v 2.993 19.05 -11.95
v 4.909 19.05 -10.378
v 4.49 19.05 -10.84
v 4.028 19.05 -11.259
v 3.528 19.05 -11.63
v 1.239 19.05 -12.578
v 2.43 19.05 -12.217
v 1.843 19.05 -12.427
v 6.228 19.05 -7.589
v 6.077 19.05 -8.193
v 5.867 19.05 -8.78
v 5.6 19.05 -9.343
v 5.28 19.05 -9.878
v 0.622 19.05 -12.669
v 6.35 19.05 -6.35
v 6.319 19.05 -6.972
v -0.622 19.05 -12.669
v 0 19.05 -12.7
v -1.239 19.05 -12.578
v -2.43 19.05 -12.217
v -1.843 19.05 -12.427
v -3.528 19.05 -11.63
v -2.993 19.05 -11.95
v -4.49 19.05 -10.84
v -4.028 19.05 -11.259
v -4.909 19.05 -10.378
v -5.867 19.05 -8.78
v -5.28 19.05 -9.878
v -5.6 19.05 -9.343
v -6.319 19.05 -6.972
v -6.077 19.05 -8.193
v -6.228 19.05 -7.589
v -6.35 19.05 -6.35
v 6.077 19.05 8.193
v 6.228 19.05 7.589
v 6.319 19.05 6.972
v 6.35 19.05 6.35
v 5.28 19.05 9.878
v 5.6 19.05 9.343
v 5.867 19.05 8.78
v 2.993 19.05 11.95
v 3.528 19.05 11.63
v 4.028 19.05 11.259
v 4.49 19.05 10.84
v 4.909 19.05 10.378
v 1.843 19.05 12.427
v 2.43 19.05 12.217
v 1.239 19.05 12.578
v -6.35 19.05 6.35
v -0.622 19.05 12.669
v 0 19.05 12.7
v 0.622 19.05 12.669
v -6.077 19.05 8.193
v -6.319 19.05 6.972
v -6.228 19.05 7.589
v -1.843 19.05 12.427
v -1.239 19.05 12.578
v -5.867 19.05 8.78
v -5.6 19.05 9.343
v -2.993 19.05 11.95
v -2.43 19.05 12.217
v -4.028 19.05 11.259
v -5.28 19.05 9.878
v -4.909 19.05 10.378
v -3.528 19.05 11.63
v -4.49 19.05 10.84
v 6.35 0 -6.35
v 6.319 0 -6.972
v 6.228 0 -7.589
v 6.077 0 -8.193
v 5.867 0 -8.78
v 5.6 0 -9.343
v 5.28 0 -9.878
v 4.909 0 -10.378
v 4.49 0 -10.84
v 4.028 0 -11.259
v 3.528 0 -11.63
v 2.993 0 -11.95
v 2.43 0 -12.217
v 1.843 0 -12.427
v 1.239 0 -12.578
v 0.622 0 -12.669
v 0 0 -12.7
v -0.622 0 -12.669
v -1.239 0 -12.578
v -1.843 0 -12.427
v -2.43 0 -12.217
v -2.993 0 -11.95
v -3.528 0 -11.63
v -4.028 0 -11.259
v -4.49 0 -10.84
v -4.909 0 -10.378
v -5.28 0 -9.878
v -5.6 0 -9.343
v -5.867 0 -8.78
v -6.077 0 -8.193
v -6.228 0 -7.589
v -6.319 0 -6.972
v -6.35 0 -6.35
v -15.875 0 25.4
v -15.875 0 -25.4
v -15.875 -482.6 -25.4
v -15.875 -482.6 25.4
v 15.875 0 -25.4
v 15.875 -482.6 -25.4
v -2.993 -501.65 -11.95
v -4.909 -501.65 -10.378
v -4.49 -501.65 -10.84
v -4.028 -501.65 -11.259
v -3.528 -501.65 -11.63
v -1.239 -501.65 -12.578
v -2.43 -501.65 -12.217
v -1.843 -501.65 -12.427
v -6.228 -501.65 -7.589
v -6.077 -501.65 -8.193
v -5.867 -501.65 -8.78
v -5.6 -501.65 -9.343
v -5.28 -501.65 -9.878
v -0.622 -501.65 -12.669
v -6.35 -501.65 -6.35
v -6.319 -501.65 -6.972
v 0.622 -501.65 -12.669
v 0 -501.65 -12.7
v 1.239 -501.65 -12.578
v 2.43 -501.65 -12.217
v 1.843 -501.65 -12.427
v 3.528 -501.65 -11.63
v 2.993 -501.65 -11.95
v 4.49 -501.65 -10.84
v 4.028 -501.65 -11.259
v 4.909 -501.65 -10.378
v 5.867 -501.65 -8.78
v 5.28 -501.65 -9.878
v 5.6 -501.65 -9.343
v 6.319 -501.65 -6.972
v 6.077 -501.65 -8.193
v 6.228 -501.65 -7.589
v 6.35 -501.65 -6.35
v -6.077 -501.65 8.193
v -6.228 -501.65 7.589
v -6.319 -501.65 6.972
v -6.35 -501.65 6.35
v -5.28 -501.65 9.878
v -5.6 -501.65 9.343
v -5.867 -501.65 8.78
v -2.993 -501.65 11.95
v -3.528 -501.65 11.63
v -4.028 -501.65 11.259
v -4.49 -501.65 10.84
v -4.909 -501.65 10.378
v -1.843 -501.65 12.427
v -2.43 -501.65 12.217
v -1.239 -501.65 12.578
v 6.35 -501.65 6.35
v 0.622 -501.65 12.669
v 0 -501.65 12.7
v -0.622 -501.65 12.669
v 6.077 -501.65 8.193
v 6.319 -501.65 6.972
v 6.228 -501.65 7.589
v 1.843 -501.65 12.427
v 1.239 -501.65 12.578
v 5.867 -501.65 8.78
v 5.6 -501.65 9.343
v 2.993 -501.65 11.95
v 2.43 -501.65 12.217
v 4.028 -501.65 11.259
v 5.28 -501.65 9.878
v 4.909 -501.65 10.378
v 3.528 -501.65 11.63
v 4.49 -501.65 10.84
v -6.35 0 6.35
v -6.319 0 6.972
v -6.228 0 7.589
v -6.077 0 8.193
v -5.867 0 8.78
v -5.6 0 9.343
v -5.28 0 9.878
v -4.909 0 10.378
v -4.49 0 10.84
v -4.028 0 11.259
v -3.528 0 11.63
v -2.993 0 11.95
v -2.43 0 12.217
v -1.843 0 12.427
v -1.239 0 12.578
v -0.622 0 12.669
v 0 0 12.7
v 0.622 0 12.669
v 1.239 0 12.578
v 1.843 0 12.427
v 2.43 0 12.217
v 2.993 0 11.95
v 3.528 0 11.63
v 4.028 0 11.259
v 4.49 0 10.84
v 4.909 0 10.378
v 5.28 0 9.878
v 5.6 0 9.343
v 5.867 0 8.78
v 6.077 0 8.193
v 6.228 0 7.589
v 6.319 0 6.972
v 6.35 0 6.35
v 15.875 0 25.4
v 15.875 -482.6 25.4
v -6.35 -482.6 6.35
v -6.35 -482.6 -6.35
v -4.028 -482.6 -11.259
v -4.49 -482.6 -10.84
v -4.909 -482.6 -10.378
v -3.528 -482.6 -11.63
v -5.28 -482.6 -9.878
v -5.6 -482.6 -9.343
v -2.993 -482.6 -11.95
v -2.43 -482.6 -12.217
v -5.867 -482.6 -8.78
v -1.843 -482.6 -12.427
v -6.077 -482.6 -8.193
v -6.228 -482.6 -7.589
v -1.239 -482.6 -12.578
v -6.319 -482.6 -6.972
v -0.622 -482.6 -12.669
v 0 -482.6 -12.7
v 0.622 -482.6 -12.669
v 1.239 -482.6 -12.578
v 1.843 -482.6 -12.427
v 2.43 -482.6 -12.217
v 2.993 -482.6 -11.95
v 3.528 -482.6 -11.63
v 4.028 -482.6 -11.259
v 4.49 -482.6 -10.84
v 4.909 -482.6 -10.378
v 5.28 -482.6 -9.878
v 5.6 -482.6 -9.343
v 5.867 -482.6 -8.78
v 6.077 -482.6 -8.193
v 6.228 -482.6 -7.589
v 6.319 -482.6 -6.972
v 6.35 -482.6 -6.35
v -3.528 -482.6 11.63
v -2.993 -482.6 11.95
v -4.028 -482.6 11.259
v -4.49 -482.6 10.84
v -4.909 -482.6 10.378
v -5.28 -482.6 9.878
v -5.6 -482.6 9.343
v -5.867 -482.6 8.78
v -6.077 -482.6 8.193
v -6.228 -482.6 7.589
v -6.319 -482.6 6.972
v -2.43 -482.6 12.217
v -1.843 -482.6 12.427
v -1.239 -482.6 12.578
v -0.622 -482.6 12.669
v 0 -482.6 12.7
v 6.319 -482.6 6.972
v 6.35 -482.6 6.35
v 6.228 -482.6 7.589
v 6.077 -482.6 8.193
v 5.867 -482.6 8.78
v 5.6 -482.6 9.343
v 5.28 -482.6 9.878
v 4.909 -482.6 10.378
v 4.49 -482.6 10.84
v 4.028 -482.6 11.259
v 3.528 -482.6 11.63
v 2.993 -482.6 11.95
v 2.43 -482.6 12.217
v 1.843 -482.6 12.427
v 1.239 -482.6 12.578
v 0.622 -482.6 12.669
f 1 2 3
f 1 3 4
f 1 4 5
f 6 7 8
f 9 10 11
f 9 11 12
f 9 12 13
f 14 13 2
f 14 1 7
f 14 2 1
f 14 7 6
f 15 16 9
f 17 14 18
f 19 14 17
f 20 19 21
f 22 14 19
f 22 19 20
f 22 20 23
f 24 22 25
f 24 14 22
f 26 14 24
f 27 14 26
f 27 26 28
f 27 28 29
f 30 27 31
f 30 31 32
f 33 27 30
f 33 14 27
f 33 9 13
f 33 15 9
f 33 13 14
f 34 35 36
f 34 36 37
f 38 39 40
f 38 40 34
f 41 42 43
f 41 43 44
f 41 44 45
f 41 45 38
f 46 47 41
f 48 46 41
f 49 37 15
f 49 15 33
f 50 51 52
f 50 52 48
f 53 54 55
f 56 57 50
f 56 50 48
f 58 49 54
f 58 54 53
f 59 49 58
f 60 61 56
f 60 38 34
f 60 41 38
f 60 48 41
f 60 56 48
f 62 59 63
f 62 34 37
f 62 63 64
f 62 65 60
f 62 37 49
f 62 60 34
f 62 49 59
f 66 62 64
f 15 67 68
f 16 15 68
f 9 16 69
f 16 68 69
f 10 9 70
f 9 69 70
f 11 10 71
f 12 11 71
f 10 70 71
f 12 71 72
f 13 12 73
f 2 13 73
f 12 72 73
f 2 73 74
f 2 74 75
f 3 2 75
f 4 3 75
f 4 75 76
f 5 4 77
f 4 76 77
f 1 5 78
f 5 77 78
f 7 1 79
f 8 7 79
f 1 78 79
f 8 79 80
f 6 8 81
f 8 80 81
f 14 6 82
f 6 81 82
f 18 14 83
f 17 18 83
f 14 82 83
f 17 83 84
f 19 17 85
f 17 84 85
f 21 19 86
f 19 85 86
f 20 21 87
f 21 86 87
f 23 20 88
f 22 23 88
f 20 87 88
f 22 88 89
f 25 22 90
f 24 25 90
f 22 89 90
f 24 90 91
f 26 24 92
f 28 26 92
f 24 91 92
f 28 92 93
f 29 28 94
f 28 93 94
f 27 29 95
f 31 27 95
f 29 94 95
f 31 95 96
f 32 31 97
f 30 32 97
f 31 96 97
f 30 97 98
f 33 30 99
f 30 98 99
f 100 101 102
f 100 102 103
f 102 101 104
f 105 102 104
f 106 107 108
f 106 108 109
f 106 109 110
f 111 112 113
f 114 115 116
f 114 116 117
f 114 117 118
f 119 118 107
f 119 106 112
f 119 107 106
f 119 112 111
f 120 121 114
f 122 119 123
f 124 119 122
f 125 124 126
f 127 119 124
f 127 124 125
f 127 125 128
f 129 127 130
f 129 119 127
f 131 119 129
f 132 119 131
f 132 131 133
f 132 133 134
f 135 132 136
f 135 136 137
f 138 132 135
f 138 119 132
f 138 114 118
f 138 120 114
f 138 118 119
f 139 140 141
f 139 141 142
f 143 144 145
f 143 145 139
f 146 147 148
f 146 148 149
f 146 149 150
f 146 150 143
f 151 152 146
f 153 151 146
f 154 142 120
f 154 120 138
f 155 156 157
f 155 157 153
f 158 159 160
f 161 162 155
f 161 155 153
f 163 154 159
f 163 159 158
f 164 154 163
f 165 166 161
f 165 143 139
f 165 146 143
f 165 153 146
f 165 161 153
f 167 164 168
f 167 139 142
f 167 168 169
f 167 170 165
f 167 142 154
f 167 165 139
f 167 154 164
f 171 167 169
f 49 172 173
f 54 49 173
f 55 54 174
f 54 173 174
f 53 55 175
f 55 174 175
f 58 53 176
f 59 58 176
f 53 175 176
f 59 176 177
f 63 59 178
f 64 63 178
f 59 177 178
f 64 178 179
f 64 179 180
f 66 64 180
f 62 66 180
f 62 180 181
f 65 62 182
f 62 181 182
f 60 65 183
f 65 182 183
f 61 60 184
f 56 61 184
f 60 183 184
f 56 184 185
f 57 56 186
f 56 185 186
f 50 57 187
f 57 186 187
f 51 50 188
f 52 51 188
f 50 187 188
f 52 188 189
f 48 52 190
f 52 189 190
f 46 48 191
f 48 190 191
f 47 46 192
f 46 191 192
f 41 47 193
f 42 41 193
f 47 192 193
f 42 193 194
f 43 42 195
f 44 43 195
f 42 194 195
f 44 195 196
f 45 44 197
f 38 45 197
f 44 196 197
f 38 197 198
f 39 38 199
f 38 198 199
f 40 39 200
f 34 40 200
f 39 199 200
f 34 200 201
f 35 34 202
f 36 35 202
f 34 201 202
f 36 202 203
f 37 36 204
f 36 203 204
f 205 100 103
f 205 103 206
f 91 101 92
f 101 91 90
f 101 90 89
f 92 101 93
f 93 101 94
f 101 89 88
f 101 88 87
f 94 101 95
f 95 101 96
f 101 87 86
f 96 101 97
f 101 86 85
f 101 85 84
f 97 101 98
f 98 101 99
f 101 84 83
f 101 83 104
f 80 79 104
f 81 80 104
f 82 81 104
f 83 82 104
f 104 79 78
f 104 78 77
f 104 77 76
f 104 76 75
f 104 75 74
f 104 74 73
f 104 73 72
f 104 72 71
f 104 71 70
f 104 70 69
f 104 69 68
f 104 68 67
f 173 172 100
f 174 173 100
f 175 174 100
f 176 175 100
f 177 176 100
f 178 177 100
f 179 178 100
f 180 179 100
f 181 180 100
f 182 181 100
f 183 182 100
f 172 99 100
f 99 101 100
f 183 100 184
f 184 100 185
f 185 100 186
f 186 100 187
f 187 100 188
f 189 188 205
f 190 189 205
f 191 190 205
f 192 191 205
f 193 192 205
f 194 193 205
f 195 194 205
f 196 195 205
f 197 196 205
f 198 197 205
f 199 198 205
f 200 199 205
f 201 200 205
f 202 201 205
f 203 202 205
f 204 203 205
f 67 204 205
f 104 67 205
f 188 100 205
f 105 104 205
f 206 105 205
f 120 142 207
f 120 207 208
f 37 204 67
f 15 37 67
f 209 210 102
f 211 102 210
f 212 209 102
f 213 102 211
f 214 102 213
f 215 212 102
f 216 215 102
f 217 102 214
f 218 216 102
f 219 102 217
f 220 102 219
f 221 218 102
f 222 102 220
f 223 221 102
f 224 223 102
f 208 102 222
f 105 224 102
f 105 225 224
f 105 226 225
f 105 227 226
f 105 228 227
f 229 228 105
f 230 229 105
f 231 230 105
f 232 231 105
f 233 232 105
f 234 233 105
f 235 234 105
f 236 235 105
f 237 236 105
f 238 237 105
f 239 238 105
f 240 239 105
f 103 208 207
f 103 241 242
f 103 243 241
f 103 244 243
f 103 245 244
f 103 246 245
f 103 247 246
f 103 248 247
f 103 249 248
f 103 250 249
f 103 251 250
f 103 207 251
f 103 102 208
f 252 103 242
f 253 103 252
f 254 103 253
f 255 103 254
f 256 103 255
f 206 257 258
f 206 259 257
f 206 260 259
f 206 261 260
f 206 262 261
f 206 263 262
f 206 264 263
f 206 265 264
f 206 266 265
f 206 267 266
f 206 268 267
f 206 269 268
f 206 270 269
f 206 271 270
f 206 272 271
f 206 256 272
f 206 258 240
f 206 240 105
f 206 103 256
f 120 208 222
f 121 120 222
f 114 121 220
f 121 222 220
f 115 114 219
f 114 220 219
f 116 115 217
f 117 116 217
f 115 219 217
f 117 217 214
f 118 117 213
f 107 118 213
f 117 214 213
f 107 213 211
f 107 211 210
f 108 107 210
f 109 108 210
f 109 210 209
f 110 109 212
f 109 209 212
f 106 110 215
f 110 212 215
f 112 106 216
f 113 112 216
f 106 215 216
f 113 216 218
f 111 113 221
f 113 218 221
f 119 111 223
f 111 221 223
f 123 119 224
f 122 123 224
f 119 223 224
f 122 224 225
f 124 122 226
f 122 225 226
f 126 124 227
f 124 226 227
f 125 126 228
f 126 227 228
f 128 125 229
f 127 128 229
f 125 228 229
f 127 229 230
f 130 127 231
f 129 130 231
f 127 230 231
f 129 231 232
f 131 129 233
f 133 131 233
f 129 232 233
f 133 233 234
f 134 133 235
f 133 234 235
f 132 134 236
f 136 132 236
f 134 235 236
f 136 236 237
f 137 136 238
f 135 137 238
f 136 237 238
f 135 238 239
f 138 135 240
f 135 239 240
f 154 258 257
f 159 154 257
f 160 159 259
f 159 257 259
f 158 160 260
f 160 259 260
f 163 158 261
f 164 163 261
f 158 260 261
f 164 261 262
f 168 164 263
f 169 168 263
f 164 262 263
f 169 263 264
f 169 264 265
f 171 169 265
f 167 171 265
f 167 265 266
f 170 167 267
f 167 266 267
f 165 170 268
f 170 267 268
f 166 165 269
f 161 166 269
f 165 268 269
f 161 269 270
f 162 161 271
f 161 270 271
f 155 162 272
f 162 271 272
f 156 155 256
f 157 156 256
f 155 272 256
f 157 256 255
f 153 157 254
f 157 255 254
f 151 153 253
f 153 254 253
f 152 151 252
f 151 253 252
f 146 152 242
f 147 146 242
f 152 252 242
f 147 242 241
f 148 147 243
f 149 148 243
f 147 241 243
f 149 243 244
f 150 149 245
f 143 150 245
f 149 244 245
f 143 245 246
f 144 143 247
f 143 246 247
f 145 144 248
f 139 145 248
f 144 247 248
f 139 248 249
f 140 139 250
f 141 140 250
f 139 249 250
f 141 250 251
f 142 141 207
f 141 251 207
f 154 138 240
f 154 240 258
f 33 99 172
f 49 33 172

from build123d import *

# Parameters (mm, degrees)
F0_W     = 31.75
F0_H     = 50.8
F1_DEPTH = 482.6
F3_DEPTH = 19.05
F5_DEPTH = 19.05


with BuildPart() as f1:
    # F0 (on Front) → F1 (new body)
    with BuildSketch(Plane.XZ):
        Rectangle(F0_W, F0_H)
    extrude(amount=F1_DEPTH)

    # F2 (on face) → F3 (join)
    with BuildSketch(Plane(origin=(0, 0, 0), x_dir=(-1, 0, 0), z_dir=(0, 1, 0))):
        with BuildLine():
            Line((-6.35, 6.35), (-6.35, -6.35))
            ThreePointArc((-6.35, -6.35), (0, -12.7), (6.35, -6.35))
            Line((6.35, -6.35), (6.35, 6.35))
            ThreePointArc((6.35, 6.35), (0, 12.7), (-6.35, 6.35))
        make_face()
    extrude(amount=F3_DEPTH)

    # F4 (on face) → F5 (join)
    with BuildSketch(Plane.XZ.offset(482.6)):
        with BuildLine():
            Line((-6.35, 6.35), (-6.35, -6.35))
            ThreePointArc((-6.35, -6.35), (0, -12.7), (6.35, -6.35))
            Line((6.35, -6.35), (6.35, 6.35))
            ThreePointArc((6.35, 6.35), (0, 12.7), (-6.35, 6.35))
        make_face()
    extrude(amount=F5_DEPTH)


solid = f1.part
